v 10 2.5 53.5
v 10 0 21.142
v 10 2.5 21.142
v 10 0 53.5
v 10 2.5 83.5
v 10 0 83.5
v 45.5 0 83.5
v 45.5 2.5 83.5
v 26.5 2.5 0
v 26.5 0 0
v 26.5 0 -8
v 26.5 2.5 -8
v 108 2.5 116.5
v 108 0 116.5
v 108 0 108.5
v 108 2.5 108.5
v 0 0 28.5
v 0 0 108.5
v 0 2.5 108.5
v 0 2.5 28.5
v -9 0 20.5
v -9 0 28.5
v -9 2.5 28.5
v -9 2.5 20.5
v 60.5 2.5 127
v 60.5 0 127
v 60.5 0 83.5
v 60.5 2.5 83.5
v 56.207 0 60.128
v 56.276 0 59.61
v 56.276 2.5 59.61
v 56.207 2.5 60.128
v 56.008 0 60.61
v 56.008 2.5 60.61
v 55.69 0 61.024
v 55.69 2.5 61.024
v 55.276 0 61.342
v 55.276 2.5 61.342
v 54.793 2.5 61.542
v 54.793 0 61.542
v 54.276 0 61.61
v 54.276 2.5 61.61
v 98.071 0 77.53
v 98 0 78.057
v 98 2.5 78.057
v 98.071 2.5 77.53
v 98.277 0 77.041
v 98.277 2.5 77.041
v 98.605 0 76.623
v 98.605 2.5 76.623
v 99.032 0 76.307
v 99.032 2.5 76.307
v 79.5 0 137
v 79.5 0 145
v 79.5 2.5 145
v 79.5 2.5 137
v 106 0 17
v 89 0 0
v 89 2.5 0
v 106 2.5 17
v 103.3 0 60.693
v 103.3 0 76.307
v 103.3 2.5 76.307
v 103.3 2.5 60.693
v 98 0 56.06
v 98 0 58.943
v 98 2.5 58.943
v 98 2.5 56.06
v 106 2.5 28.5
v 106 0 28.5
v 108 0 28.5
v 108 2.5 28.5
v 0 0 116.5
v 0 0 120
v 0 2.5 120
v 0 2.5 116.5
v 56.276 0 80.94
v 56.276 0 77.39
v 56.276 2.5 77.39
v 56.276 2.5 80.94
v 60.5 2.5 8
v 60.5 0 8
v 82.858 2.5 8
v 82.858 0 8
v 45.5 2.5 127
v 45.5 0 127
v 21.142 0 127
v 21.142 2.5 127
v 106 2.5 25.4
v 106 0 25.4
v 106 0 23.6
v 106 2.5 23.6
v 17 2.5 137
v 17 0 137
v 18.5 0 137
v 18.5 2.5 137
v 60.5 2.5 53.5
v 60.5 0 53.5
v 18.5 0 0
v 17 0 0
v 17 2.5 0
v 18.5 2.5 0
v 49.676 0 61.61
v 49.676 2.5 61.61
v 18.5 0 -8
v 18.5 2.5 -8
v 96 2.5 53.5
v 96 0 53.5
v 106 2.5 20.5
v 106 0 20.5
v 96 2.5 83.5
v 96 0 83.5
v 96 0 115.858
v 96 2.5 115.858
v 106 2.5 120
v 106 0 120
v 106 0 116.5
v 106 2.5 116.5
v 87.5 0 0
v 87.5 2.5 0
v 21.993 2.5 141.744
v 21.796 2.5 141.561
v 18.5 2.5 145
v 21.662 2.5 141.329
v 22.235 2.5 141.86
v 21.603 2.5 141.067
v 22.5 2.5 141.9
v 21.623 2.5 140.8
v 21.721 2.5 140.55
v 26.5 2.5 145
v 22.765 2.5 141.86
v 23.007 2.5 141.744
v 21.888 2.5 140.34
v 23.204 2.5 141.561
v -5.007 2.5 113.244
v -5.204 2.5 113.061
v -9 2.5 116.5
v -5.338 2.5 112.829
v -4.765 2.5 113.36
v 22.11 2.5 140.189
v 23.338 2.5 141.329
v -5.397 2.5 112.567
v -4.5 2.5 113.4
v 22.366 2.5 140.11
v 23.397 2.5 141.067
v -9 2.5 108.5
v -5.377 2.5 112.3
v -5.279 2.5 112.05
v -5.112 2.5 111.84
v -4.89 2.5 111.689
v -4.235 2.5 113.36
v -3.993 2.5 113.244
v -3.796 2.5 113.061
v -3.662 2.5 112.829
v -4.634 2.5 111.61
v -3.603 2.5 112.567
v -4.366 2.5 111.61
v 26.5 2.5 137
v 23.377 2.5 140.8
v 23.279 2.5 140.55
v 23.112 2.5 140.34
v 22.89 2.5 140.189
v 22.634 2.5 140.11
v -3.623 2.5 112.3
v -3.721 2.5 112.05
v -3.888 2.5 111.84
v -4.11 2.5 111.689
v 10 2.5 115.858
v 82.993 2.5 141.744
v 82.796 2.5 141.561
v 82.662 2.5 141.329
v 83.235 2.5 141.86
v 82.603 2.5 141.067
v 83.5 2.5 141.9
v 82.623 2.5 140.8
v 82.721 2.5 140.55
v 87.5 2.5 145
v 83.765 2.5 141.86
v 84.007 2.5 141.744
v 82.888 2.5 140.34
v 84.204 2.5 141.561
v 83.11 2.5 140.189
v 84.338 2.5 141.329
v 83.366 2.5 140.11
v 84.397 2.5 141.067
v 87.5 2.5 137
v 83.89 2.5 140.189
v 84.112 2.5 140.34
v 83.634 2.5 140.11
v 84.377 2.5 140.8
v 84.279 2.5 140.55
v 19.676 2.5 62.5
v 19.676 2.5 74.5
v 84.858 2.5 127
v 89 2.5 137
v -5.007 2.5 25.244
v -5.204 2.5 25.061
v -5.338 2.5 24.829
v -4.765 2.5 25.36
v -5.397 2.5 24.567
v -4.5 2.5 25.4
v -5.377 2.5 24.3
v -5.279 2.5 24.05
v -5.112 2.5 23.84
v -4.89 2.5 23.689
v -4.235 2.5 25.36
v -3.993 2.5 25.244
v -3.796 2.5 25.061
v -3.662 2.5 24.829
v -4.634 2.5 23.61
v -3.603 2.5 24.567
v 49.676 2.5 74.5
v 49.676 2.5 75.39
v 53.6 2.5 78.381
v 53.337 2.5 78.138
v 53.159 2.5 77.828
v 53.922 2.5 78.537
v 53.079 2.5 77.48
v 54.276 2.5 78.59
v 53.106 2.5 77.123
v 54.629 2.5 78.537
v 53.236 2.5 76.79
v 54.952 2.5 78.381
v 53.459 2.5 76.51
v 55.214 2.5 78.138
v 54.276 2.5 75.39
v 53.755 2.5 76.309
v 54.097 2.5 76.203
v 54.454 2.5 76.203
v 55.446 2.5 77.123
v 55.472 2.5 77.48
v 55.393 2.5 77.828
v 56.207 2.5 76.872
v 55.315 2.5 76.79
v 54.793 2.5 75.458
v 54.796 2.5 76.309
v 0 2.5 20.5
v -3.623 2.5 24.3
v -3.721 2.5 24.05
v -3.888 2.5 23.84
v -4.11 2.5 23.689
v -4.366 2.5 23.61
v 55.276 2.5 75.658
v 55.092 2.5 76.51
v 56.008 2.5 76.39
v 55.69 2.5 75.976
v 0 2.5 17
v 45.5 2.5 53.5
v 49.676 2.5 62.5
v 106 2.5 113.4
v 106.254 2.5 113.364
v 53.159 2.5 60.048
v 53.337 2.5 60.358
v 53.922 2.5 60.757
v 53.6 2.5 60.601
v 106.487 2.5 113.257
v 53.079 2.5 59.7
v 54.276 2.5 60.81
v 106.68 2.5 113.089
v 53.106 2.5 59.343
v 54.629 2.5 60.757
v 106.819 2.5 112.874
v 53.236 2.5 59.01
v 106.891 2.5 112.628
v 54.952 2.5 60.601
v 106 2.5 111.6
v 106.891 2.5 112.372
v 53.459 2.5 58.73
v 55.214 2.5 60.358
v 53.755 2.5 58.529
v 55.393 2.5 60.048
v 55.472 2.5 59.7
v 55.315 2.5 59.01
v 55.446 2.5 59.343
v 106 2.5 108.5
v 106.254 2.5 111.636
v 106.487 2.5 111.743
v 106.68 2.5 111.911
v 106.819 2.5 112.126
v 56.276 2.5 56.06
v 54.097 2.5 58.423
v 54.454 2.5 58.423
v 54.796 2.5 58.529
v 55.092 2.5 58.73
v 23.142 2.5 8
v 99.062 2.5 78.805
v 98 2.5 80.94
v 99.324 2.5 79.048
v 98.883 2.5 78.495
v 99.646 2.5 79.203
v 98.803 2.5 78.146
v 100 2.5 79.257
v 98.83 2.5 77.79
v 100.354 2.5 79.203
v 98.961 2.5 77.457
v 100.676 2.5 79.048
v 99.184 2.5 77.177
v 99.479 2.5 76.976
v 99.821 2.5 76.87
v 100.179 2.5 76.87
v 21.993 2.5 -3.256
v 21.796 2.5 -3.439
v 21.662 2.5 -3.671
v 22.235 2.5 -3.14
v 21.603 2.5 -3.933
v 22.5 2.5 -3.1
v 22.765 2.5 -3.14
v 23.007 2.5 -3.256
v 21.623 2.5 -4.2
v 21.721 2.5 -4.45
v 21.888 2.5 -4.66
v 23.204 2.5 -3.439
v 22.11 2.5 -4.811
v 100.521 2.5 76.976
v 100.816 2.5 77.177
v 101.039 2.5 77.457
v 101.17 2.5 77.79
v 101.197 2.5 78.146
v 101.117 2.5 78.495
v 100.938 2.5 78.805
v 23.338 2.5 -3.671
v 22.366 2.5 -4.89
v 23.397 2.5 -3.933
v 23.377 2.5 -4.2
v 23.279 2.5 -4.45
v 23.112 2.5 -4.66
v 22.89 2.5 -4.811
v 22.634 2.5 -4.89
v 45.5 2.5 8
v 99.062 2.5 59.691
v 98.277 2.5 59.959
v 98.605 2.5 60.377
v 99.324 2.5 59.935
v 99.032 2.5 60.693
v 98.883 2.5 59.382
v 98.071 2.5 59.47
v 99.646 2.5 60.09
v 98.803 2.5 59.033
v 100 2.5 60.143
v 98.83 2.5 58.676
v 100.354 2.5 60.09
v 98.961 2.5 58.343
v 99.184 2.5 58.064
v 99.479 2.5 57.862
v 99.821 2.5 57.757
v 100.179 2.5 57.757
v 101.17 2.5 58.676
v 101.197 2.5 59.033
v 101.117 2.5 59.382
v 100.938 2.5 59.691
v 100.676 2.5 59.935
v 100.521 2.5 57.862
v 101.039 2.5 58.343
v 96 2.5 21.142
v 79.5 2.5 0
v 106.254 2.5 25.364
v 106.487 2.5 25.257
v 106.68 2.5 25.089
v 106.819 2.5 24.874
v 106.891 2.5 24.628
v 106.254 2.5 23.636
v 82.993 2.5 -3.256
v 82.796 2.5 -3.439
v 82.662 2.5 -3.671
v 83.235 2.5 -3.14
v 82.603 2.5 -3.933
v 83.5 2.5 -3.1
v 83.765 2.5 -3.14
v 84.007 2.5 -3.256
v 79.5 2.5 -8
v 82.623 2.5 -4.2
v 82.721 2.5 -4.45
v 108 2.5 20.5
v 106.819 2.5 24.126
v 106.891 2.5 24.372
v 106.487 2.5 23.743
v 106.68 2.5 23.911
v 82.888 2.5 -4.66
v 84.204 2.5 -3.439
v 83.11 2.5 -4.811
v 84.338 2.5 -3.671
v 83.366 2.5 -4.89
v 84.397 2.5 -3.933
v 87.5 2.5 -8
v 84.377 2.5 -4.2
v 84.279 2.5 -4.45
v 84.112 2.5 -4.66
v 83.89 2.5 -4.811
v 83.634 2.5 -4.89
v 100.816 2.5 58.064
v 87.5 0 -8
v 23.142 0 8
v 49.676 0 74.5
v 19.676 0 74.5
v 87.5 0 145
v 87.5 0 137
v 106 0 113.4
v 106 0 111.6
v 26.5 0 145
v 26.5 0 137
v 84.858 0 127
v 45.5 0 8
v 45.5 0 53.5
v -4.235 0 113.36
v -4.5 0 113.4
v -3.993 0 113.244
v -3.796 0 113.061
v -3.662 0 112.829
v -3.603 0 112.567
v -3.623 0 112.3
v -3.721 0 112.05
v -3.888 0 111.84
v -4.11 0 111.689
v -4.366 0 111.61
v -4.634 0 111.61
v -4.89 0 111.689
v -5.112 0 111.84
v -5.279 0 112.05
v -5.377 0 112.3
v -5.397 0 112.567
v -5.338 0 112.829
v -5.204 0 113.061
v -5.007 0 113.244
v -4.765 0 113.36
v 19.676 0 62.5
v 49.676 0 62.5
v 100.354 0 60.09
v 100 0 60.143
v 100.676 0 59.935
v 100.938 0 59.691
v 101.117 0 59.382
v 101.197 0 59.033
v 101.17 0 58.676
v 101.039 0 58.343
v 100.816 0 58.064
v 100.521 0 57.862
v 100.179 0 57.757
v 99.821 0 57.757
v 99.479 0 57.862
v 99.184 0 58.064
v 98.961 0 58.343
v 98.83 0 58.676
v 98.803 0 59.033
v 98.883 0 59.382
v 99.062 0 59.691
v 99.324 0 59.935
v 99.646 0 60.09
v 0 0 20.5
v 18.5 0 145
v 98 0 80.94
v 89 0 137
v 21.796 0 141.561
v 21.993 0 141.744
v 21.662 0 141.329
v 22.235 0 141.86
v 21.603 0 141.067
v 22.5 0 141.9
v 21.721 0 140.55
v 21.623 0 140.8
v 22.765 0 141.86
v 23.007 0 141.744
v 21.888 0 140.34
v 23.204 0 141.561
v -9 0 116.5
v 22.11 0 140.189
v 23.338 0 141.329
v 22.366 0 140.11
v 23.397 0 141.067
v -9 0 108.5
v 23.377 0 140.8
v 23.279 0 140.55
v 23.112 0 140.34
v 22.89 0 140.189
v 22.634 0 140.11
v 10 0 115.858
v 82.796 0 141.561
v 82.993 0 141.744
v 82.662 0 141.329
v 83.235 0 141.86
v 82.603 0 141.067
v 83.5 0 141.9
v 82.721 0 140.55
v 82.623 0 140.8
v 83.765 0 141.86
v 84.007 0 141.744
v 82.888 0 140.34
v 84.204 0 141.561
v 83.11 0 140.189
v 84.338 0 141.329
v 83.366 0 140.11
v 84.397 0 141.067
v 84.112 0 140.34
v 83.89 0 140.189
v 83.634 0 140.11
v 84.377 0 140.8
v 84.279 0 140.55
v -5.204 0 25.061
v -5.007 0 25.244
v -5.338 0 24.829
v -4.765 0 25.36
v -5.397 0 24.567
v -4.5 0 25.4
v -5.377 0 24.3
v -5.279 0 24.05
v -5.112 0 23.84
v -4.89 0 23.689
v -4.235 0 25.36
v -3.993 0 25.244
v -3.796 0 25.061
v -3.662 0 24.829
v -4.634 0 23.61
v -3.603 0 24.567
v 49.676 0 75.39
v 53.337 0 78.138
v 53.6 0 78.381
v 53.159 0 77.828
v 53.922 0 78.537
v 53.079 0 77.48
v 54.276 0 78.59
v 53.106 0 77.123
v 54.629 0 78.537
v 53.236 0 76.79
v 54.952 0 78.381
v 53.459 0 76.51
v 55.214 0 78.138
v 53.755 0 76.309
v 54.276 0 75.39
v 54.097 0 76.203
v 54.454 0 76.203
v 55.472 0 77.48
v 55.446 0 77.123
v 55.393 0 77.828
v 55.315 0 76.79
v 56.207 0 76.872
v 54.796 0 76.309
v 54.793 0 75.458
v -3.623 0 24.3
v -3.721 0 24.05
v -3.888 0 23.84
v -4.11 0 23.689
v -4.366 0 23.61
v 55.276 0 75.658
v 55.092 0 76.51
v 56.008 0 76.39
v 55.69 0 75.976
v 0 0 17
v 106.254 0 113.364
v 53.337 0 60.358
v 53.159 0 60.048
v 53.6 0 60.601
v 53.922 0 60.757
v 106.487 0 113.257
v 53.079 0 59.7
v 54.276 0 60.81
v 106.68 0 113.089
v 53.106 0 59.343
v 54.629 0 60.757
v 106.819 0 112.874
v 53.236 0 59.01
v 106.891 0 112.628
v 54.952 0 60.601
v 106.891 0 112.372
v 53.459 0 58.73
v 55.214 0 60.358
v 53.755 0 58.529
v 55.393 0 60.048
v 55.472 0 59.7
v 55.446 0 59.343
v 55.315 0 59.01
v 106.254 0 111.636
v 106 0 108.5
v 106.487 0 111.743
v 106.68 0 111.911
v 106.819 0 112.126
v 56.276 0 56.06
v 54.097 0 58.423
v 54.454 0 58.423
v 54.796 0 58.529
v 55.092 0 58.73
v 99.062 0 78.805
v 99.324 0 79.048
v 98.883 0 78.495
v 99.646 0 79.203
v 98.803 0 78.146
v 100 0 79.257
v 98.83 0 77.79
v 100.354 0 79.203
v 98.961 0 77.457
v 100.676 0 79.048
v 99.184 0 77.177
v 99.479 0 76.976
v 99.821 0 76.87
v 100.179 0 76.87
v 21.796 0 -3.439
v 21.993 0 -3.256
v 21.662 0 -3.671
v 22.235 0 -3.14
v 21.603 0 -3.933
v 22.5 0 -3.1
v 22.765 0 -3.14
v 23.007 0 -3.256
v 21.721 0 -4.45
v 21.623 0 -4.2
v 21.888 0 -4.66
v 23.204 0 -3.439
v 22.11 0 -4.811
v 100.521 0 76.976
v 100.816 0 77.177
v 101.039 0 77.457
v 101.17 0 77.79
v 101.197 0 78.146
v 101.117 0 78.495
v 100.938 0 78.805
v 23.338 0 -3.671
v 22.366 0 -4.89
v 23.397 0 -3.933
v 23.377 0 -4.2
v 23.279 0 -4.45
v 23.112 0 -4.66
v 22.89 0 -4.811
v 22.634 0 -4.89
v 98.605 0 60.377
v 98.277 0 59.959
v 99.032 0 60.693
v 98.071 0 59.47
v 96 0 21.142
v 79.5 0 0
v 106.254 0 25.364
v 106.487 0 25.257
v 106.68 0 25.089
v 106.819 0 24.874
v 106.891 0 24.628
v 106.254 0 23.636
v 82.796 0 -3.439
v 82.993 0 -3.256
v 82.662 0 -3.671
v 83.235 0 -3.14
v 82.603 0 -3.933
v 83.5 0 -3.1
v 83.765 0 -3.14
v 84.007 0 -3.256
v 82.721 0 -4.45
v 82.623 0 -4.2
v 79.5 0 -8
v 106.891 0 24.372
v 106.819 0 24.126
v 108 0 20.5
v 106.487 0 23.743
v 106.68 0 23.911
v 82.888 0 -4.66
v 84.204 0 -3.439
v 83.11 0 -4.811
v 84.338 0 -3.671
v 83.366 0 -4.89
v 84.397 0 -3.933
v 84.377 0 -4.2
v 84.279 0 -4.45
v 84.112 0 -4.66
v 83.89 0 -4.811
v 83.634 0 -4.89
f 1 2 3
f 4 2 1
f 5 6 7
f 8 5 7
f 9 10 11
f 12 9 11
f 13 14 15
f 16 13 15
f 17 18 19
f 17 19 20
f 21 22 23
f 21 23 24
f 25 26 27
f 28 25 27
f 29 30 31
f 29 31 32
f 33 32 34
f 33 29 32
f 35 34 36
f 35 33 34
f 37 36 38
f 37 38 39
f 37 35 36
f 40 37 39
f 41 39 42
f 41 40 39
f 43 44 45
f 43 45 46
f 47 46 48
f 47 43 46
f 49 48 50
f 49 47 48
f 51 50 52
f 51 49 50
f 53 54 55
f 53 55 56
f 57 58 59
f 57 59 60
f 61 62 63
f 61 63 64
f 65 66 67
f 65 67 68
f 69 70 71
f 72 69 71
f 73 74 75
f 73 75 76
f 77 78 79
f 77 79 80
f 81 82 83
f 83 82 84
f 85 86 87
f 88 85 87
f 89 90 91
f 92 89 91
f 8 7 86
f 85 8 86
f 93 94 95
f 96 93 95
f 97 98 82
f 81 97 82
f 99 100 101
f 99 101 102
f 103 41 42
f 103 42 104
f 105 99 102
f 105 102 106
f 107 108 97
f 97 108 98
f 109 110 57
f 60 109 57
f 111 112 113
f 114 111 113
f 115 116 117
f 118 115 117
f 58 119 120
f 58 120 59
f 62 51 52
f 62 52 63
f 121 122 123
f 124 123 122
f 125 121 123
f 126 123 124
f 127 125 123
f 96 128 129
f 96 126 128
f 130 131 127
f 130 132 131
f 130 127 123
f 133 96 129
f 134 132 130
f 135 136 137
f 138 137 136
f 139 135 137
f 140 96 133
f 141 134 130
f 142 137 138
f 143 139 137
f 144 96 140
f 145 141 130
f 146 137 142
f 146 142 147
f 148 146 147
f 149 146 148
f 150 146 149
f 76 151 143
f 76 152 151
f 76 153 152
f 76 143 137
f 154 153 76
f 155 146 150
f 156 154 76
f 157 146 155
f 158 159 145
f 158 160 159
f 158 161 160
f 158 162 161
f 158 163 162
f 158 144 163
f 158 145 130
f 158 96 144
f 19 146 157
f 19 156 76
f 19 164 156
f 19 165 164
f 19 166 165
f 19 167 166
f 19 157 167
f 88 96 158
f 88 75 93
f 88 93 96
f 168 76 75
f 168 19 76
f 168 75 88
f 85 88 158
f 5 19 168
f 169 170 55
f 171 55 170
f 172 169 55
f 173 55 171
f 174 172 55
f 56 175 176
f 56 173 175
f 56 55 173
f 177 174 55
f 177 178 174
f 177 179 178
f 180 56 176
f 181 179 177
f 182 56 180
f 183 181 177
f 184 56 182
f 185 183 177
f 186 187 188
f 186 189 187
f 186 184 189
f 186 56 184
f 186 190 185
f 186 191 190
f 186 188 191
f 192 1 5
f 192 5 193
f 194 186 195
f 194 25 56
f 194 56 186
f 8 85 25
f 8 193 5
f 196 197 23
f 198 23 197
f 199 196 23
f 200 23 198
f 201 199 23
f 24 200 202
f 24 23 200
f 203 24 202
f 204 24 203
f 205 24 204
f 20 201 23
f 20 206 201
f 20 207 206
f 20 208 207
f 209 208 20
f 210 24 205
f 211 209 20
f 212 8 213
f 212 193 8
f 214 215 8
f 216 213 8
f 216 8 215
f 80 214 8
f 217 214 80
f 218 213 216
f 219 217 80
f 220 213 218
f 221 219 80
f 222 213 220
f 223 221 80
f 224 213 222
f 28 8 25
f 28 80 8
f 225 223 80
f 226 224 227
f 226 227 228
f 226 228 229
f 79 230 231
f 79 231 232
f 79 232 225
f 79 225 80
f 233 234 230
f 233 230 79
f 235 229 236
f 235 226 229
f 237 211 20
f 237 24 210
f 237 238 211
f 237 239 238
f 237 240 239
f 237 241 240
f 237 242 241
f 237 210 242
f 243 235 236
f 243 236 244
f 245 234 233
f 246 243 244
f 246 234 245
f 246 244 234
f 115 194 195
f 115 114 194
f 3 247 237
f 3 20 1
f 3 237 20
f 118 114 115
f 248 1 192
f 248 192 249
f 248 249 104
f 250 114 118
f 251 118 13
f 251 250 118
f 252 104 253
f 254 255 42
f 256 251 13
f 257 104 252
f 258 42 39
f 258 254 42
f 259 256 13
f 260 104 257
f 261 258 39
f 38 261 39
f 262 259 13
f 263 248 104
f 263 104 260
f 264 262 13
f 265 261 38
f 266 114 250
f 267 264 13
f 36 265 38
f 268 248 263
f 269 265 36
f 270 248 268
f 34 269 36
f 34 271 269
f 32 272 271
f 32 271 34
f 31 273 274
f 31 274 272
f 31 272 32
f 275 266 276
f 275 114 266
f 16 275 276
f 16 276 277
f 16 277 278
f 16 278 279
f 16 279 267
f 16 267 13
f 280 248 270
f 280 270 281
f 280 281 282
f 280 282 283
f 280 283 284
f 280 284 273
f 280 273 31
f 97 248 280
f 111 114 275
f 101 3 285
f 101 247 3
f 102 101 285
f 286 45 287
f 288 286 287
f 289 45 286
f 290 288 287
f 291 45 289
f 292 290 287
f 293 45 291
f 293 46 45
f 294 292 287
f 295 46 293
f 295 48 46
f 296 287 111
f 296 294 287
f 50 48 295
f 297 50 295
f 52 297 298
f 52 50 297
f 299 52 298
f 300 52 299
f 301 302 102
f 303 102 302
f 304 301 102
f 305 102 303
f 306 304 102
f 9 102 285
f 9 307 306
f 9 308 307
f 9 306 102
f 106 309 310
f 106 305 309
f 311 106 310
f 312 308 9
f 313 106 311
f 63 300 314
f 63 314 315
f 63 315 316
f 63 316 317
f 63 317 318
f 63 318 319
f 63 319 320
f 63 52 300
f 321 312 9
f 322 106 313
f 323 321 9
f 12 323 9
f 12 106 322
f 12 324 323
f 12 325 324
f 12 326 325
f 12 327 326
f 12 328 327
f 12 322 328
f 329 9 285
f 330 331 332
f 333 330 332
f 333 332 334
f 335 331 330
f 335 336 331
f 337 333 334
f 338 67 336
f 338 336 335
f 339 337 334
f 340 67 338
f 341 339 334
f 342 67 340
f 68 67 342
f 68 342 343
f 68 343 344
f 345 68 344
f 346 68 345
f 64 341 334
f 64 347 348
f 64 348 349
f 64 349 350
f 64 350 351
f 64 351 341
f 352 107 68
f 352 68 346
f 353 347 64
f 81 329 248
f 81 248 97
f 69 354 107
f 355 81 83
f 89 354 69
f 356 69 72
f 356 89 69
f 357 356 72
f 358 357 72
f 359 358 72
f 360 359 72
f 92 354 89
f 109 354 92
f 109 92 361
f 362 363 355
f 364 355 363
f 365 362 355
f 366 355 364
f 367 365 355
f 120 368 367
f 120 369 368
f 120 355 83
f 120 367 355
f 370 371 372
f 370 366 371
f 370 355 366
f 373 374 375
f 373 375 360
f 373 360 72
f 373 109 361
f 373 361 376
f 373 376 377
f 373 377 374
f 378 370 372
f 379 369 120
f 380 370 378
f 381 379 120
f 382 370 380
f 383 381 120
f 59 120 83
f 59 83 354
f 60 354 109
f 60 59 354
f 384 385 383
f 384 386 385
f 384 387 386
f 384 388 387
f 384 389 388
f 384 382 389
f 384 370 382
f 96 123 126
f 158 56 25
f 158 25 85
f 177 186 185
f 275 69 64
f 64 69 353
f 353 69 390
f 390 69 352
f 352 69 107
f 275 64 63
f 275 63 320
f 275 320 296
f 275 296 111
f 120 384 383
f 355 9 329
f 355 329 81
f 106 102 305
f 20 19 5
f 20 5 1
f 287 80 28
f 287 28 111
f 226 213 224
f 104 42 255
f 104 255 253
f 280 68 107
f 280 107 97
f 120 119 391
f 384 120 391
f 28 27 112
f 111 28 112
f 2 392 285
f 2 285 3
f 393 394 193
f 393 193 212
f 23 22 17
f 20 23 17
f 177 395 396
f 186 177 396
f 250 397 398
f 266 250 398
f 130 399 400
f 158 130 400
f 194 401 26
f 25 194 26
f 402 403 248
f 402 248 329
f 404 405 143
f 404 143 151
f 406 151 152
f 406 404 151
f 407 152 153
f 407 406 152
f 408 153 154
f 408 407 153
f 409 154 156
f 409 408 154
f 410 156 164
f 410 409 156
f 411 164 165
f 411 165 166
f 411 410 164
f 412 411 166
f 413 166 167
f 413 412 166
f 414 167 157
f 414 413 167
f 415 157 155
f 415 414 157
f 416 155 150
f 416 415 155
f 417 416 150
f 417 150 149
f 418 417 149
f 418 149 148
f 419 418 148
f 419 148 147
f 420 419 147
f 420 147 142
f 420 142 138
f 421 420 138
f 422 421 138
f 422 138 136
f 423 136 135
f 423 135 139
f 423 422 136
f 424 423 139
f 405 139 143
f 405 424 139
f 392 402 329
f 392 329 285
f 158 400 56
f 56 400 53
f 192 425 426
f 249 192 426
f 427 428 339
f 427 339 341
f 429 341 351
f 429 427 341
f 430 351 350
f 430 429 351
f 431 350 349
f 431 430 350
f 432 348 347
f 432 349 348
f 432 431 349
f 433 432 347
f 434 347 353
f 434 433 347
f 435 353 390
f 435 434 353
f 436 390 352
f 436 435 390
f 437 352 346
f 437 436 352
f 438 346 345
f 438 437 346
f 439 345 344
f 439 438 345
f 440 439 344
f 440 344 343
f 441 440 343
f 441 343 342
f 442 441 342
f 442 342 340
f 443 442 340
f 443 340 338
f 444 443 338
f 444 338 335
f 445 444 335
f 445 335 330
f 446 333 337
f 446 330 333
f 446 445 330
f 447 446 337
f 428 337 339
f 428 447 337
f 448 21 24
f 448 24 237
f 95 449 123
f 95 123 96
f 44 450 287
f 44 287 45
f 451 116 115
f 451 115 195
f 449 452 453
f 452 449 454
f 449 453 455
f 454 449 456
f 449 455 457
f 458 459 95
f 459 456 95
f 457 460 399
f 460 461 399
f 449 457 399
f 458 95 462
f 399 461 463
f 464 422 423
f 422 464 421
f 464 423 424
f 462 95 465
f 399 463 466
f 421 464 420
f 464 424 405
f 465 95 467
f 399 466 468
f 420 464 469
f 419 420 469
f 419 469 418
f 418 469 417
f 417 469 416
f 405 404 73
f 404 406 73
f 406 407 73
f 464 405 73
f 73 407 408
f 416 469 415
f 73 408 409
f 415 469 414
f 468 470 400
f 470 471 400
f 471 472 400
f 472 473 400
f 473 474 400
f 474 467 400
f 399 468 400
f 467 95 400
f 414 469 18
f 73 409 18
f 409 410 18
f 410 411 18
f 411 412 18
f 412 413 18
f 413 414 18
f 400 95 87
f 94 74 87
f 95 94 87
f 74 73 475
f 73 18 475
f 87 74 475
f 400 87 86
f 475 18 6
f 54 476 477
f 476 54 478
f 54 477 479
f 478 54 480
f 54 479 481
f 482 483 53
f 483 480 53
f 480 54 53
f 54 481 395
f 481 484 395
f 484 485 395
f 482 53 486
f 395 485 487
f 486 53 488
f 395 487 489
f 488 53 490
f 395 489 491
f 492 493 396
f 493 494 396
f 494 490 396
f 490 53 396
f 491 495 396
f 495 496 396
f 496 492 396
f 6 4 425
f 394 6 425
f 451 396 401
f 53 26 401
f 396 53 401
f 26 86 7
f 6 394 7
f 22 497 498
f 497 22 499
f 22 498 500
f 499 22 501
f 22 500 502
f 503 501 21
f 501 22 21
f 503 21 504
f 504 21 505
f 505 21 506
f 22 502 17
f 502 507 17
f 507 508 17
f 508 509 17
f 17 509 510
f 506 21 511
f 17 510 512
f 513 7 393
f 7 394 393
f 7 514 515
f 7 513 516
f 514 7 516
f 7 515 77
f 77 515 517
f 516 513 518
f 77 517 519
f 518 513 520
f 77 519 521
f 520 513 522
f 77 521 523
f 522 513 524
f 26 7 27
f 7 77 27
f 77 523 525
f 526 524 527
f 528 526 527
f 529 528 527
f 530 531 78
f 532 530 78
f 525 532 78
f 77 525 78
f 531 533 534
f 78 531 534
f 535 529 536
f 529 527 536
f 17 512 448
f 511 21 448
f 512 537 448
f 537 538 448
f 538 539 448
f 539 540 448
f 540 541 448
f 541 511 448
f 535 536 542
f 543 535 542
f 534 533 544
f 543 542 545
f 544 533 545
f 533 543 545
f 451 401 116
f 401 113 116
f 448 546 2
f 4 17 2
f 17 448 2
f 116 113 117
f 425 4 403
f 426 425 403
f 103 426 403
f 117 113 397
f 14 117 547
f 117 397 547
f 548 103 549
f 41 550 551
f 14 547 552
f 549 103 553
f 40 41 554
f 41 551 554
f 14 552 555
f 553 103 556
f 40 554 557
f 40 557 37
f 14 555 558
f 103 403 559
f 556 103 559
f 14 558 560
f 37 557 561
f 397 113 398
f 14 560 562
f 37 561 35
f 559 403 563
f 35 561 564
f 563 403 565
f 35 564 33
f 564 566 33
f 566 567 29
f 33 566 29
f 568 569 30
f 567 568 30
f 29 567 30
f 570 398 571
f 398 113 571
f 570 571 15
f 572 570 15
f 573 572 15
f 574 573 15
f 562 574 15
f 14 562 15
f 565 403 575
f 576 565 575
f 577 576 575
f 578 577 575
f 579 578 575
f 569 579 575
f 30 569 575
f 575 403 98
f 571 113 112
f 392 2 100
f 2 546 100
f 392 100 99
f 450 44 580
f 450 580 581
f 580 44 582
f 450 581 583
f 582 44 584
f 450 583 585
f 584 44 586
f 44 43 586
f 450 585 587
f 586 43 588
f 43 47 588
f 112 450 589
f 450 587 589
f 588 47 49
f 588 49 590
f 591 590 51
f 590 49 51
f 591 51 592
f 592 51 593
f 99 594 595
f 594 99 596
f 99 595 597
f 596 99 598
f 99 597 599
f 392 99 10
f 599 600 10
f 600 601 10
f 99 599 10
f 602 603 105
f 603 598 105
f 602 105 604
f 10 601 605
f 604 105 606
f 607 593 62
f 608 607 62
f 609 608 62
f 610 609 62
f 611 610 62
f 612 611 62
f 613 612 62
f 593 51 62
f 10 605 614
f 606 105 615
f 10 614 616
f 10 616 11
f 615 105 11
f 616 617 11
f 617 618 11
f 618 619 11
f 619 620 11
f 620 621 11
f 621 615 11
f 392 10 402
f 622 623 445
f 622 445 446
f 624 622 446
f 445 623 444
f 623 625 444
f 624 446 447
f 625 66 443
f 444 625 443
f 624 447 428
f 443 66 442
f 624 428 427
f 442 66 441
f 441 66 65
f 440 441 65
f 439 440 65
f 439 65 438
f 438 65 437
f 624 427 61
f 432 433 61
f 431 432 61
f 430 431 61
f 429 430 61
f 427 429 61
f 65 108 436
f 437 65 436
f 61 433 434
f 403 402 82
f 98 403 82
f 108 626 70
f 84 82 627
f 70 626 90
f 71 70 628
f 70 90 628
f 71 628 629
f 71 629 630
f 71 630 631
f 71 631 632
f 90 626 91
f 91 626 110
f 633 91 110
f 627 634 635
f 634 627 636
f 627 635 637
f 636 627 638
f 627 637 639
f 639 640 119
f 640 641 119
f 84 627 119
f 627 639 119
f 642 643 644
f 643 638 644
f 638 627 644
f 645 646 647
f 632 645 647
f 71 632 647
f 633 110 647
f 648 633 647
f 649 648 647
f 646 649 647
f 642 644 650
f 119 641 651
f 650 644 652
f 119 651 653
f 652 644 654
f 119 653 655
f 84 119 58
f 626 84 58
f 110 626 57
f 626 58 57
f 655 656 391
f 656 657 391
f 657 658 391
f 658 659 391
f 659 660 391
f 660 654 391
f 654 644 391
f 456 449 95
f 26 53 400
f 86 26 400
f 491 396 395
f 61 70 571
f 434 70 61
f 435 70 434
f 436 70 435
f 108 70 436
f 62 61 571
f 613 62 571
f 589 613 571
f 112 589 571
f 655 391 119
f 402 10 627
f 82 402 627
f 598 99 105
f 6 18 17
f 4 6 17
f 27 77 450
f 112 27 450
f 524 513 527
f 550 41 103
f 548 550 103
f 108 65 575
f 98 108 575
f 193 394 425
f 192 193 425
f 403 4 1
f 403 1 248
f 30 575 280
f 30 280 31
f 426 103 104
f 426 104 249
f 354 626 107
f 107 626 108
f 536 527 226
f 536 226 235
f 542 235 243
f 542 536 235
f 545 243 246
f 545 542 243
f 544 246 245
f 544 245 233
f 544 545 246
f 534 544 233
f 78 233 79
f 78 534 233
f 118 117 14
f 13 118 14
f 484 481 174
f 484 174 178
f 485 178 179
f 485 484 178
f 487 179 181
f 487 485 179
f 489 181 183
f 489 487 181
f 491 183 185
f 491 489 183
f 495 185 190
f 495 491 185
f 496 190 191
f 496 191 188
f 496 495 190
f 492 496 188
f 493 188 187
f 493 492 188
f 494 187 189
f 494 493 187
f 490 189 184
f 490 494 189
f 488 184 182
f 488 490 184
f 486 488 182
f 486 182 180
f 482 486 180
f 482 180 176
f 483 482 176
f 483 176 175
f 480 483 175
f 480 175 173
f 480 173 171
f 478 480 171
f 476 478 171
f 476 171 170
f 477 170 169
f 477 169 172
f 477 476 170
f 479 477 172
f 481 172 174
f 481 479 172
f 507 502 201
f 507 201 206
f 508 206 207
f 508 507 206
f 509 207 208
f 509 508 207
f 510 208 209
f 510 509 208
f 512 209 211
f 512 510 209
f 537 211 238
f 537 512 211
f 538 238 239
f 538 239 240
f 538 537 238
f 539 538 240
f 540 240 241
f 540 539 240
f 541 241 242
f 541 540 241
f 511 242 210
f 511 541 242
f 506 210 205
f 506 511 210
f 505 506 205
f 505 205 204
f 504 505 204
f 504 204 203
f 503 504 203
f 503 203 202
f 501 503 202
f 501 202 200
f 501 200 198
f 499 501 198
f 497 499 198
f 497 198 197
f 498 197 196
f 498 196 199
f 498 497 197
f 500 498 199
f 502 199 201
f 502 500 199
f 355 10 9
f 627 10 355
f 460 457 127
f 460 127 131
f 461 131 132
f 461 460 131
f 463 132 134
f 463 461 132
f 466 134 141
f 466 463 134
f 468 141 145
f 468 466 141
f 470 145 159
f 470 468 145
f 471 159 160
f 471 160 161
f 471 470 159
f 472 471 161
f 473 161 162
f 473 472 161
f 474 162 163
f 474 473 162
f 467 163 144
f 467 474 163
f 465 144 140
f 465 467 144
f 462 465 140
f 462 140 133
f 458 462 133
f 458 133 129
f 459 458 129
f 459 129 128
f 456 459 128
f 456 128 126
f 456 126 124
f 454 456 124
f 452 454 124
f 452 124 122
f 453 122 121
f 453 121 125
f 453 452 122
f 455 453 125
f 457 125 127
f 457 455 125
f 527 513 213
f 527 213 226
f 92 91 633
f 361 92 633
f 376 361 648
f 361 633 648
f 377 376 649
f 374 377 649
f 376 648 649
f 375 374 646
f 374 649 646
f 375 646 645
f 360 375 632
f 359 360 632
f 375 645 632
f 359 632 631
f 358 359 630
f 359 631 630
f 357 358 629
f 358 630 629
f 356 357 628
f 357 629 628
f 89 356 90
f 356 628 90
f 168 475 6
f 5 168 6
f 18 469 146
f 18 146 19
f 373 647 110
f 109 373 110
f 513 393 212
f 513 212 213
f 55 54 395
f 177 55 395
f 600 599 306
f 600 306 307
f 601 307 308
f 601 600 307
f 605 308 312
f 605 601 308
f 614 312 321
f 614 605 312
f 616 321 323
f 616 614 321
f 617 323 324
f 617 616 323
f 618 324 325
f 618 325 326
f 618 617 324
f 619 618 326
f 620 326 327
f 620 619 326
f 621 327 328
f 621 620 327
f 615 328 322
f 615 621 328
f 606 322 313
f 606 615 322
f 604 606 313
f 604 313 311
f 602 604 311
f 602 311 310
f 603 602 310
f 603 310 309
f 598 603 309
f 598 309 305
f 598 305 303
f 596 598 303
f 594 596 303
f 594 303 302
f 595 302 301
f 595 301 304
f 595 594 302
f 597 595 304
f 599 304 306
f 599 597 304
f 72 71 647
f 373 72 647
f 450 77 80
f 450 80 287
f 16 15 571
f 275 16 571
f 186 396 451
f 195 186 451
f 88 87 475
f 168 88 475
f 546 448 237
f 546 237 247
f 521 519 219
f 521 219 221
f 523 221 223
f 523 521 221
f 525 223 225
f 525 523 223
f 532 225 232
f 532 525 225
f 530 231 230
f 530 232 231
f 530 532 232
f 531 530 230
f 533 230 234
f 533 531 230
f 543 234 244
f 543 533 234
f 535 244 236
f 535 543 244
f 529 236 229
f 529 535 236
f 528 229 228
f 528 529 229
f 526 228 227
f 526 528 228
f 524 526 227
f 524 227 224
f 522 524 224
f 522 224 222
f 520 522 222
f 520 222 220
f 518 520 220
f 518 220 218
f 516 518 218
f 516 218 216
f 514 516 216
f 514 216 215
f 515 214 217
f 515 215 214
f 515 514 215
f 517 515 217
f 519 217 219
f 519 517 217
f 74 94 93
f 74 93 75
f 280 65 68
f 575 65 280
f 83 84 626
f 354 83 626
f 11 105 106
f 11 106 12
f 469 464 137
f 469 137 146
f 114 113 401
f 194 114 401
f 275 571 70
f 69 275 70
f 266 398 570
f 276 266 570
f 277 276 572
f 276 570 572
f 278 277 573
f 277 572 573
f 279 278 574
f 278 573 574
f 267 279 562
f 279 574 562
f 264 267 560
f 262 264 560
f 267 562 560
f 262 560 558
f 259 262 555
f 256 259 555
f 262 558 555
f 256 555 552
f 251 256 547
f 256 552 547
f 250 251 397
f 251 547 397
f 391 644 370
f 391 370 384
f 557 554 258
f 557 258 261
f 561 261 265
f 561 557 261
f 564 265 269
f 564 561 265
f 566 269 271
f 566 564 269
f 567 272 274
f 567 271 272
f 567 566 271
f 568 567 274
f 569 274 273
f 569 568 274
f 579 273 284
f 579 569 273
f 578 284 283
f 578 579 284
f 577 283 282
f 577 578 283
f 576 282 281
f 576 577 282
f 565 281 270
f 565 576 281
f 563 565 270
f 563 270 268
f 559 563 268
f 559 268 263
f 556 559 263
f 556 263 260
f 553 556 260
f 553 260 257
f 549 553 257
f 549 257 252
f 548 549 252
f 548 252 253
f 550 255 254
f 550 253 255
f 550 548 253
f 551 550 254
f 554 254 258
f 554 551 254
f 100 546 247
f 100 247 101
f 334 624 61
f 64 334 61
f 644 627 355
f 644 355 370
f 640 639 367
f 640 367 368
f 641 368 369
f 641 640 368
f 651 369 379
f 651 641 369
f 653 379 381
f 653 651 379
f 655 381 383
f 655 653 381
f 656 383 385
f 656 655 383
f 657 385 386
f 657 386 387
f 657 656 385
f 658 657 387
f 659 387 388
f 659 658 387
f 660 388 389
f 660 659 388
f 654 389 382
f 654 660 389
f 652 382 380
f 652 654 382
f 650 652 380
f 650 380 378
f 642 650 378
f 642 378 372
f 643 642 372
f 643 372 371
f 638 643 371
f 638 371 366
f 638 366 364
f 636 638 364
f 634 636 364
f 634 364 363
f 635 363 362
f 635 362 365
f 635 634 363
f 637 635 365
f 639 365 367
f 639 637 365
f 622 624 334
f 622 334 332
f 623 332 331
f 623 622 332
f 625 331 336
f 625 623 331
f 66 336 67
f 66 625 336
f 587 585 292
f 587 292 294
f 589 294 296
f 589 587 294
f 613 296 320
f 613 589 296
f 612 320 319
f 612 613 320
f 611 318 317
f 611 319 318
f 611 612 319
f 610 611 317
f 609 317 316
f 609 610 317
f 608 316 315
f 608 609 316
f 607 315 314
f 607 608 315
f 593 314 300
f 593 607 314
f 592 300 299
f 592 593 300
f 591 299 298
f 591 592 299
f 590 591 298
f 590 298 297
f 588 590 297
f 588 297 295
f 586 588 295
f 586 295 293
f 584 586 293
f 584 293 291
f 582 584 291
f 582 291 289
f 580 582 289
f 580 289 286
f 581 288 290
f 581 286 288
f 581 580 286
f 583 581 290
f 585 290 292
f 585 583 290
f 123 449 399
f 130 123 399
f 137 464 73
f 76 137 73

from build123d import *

# Parameters (mm, degrees)
SKETCH1_W               = 106
SKETCH1_H               = 137
BOSS_EXTRUDE1_DEPTH     = 2.5
CUT_EXTRUDE1_DEPTH      = 174.237553665
CUT_EXTRUDE1_DEPTH_BACK = 174.237553665
SKETCH5_W               = 8
SKETCH5_H               = 8
SKETCH5_R               = 0.9
SKETCH5_W_2             = 9
BOSS_EXTRUDE4_DEPTH     = 2.5
CUT_EXTRUDE4_DEPTH      = 181.818278943
CUT_EXTRUDE4_DEPTH_BACK = 181.818278943
SKETCH3_R               = 1.2
SKETCH3_W               = 6.263237977
SKETCH3_H               = 0.25
SKETCH3_W_2             = 4.268245837
CUT_EXTRUDE5_DEPTH      = 181.818278943
CUT_EXTRUDE5_DEPTH_BACK = 181.818278943
SKETCH7_W               = 30
SKETCH7_H               = 12


with BuildPart() as part:
    # Sketch1 → Boss-Extrude1 (new body)
    with BuildSketch(Plane(origin=(0, 0, 0), x_dir=(1, 0, 0), z_dir=(0, 1, 0))):
        with Locations((53, -68.5)):
            Rectangle(SKETCH1_W, SKETCH1_H)
    extrude(amount=BOSS_EXTRUDE1_DEPTH)

    # Sketch2 → Cut-Extrude1 (cut, two sides: drawn at the far end of the back side and taken through both)
    with BuildSketch(Plane(origin=(0, 2.5, 0), x_dir=(1, 0, 0), z_dir=(0, 1, 0)).offset(-CUT_EXTRUDE1_DEPTH_BACK)):
        Polygon((60.5, -83.5), (96, -83.5), (96, -115.857864376), (84.857864376, -127), (60.5, -127), align=None)
        Polygon((106, -120), (89, -137), (106, -137), align=None)
        Polygon((17, -137), (0, -120), (0, -137), align=None)
        Polygon((45.5, -127), (21.142135624, -127), (10, -115.857864376), (10, -83.5), (45.5, -83.5), align=None)
        Polygon((10, -53.5), (45.5, -53.5), (45.5, -8), (23.142135624, -8), (10, -21.142135624), align=None)
        Polygon((60.5, -53.5), (60.5, -8), (82.857864376, -8), (96, -21.142135624), (96, -53.5), align=None)
        Polygon((106, 0), (89, 0), (106, -17), align=None)
        Polygon((0, 0), (0, -17), (17, 0), align=None)
    extrude(amount=CUT_EXTRUDE1_DEPTH + CUT_EXTRUDE1_DEPTH_BACK, mode=Mode.SUBTRACT)

    # Sketch5 → Boss-Extrude4 (add)
    # profile 1 of 8: a face of its own
    with BuildSketch(Plane(origin=(0, 0, 0), x_dir=(1, 0, 0), z_dir=(0, 1, 0))):
        with Locations((22.5, -141)):
            Rectangle(SKETCH5_W, SKETCH5_H)
        with Locations(Location((22.5, -141, 0), (0, 0, 270))):
            Circle(SKETCH5_R, mode=Mode.SUBTRACT)
    # profile 2 of 8: a face of its own
    with BuildSketch(Plane(origin=(0, 0, 0), x_dir=(1, 0, 0), z_dir=(0, 1, 0))):
        with Locations((83.5, -141)):
            Rectangle(SKETCH5_W, SKETCH5_H)
        with Locations(Location((83.5, -141, 0), (0, 0, 270))):
            Circle(SKETCH5_R, mode=Mode.SUBTRACT)
    # profile 3 of 8: a face of its own
    with BuildSketch(Plane(origin=(0, 0, 0), x_dir=(1, 0, 0), z_dir=(0, 1, 0))):
        with Locations((83.5, 4)):
            Rectangle(SKETCH5_W, SKETCH5_H)
        with Locations(Location((83.5, 4, 0), (0, 0, 270))):
            Circle(SKETCH5_R, mode=Mode.SUBTRACT)
    # profile 4 of 8: a face of its own
    with BuildSketch(Plane(origin=(0, 0, 0), x_dir=(1, 0, 0), z_dir=(0, 1, 0))):
        with Locations((22.5, 4)):
            Rectangle(SKETCH5_W, SKETCH5_H)
        with Locations(Location((22.5, 4, 0), (0, 0, 270))):
            Circle(SKETCH5_R, mode=Mode.SUBTRACT)
    # profile 5 of 8: a face of its own
    with BuildSketch(Plane(origin=(0, 0, 0), x_dir=(1, 0, 0), z_dir=(0, 1, 0))):
        with Locations((-4.5, -112.5)):
            Rectangle(SKETCH5_W_2, SKETCH5_H)
        with Locations(Location((-4.5, -112.5, 0), (0, 0, 270))):
            Circle(SKETCH5_R, mode=Mode.SUBTRACT)
    # profile 6 of 8: a face of its own
    with BuildSketch(Plane(origin=(0, 0, 0), x_dir=(1, 0, 0), z_dir=(0, 1, 0))):
        with Locations((-4.5, -24.5)):
            Rectangle(SKETCH5_W_2, SKETCH5_H)
        with Locations(Location((-4.5, -24.5, 0), (0, 0, 270))):
            Circle(SKETCH5_R, mode=Mode.SUBTRACT)
    # profile 7 of 8: a face of its own
    with BuildSketch(Plane(origin=(0, 0, 0), x_dir=(1, 0, 0), z_dir=(0, 1, 0))):
        with BuildLine():
            Line((106, -113.4), (106, -116.5))
            Line((106, -116.5), (108, -116.5))
            Line((108, -116.5), (108, -108.5))
            Line((108, -108.5), (106, -108.5))
            Line((106, -108.5), (106, -111.6))
            ThreePointArc((106, -111.6), (106.9, -112.5), (106, -113.4))
        make_face()
    # profile 8 of 8: a face of its own
    with BuildSketch(Plane(origin=(0, 0, 0), x_dir=(1, 0, 0), z_dir=(0, 1, 0))):
        with BuildLine():
            Line((106, -25.4), (106, -28.5))
            Line((106, -28.5), (108, -28.5))
            Line((108, -28.5), (108, -20.5))
            Line((108, -20.5), (106, -20.5))
            Line((106, -20.5), (106, -23.6))
            ThreePointArc((106, -23.6), (106.9, -24.5), (106, -25.4))
        make_face()
    extrude(amount=BOSS_EXTRUDE4_DEPTH)

    # Sketch3 → Cut-Extrude4 (cut, two sides: drawn at the far end of the back side and taken through both)
    with BuildSketch(Plane(origin=(0, 2.5, 0), x_dir=(1, 0, 0), z_dir=(0, 1, 0)).offset(-CUT_EXTRUDE4_DEPTH_BACK)):
        with BuildLine():
            Line((56.27559049, -77.39), (56.27559049, -80.94))
            Line((56.27559049, -80.94), (98, -80.94))
            Line((98, -80.94), (98, -78.05675))
            ThreePointArc((98, -78.05675), (98.277140216, -77.040996997), (99.031754163, -76.30675))
            Line((99.031754163, -76.30675), (99.031754163, -76.05675))
            Line((99.031754163, -76.05675), (100, -76.05675))
            Line((100, -76.05675), (103.3, -76.05675))
            Line((103.3, -76.05675), (103.3, -60.94325))
            Line((103.3, -60.94325), (100, -60.94325))
            Line((100, -60.94325), (97.036762023, -60.94325))
            Line((97.036762023, -60.94325), (97.036762023, -60.69325))
            Line((97.036762023, -60.69325), (99.031754163, -60.69325))
            ThreePointArc((99.031754163, -60.69325), (98.277140216, -59.959003003), (98, -58.94325))
            Line((98, -58.94325), (98, -56.06))
            Line((98, -56.06), (56.27559049, -56.06))
            Line((56.27559049, -56.06), (56.27559049, -59.61))
            ThreePointArc((56.27559049, -59.61), (55.689804052, -61.024213562), (54.27559049, -61.61))
            Line((54.27559049, -61.61), (49.67559049, -61.61))
            Line((49.67559049, -61.61), (49.67559049, -75.39))
            Line((49.67559049, -75.39), (54.27559049, -75.39))
            ThreePointArc((54.27559049, -75.39), (55.689804052, -75.975786438), (56.27559049, -77.39))
        make_face()
        with Locations(Location((54.27559049, -59.61, 0), (0, 0, 270))):
            Circle(SKETCH3_R)
        with Locations(Location((54.27559049, -77.39, 0), (0, 0, 270))):
            Circle(SKETCH3_R)
        with Locations(Location((100, -78.05675, 0), (0, 0, 270))):
            Circle(SKETCH3_R)
        with Locations(Location((100, -58.94325, 0), (0, 0, 270))):
            Circle(SKETCH3_R)
        with Locations((100.168381012, -60.81825)):
            Rectangle(SKETCH3_W, SKETCH3_H)
        with Locations((101.165877082, -76.18175)):
            Rectangle(SKETCH3_W_2, SKETCH3_H)
    extrude(amount=CUT_EXTRUDE4_DEPTH + CUT_EXTRUDE4_DEPTH_BACK, mode=Mode.SUBTRACT)

    # Sketch7 → Cut-Extrude5 (cut, two sides: drawn at the far end of the back side and taken through both)
    with BuildSketch(Plane(origin=(0, 2.5, 0), x_dir=(1, 0, 0), z_dir=(0, 1, 0)).offset(-CUT_EXTRUDE5_DEPTH_BACK)):
        with Locations((34.67559049, -68.5)):
            Rectangle(SKETCH7_W, SKETCH7_H)
    extrude(amount=CUT_EXTRUDE5_DEPTH + CUT_EXTRUDE5_DEPTH_BACK, mode=Mode.SUBTRACT)


solid = part.part
